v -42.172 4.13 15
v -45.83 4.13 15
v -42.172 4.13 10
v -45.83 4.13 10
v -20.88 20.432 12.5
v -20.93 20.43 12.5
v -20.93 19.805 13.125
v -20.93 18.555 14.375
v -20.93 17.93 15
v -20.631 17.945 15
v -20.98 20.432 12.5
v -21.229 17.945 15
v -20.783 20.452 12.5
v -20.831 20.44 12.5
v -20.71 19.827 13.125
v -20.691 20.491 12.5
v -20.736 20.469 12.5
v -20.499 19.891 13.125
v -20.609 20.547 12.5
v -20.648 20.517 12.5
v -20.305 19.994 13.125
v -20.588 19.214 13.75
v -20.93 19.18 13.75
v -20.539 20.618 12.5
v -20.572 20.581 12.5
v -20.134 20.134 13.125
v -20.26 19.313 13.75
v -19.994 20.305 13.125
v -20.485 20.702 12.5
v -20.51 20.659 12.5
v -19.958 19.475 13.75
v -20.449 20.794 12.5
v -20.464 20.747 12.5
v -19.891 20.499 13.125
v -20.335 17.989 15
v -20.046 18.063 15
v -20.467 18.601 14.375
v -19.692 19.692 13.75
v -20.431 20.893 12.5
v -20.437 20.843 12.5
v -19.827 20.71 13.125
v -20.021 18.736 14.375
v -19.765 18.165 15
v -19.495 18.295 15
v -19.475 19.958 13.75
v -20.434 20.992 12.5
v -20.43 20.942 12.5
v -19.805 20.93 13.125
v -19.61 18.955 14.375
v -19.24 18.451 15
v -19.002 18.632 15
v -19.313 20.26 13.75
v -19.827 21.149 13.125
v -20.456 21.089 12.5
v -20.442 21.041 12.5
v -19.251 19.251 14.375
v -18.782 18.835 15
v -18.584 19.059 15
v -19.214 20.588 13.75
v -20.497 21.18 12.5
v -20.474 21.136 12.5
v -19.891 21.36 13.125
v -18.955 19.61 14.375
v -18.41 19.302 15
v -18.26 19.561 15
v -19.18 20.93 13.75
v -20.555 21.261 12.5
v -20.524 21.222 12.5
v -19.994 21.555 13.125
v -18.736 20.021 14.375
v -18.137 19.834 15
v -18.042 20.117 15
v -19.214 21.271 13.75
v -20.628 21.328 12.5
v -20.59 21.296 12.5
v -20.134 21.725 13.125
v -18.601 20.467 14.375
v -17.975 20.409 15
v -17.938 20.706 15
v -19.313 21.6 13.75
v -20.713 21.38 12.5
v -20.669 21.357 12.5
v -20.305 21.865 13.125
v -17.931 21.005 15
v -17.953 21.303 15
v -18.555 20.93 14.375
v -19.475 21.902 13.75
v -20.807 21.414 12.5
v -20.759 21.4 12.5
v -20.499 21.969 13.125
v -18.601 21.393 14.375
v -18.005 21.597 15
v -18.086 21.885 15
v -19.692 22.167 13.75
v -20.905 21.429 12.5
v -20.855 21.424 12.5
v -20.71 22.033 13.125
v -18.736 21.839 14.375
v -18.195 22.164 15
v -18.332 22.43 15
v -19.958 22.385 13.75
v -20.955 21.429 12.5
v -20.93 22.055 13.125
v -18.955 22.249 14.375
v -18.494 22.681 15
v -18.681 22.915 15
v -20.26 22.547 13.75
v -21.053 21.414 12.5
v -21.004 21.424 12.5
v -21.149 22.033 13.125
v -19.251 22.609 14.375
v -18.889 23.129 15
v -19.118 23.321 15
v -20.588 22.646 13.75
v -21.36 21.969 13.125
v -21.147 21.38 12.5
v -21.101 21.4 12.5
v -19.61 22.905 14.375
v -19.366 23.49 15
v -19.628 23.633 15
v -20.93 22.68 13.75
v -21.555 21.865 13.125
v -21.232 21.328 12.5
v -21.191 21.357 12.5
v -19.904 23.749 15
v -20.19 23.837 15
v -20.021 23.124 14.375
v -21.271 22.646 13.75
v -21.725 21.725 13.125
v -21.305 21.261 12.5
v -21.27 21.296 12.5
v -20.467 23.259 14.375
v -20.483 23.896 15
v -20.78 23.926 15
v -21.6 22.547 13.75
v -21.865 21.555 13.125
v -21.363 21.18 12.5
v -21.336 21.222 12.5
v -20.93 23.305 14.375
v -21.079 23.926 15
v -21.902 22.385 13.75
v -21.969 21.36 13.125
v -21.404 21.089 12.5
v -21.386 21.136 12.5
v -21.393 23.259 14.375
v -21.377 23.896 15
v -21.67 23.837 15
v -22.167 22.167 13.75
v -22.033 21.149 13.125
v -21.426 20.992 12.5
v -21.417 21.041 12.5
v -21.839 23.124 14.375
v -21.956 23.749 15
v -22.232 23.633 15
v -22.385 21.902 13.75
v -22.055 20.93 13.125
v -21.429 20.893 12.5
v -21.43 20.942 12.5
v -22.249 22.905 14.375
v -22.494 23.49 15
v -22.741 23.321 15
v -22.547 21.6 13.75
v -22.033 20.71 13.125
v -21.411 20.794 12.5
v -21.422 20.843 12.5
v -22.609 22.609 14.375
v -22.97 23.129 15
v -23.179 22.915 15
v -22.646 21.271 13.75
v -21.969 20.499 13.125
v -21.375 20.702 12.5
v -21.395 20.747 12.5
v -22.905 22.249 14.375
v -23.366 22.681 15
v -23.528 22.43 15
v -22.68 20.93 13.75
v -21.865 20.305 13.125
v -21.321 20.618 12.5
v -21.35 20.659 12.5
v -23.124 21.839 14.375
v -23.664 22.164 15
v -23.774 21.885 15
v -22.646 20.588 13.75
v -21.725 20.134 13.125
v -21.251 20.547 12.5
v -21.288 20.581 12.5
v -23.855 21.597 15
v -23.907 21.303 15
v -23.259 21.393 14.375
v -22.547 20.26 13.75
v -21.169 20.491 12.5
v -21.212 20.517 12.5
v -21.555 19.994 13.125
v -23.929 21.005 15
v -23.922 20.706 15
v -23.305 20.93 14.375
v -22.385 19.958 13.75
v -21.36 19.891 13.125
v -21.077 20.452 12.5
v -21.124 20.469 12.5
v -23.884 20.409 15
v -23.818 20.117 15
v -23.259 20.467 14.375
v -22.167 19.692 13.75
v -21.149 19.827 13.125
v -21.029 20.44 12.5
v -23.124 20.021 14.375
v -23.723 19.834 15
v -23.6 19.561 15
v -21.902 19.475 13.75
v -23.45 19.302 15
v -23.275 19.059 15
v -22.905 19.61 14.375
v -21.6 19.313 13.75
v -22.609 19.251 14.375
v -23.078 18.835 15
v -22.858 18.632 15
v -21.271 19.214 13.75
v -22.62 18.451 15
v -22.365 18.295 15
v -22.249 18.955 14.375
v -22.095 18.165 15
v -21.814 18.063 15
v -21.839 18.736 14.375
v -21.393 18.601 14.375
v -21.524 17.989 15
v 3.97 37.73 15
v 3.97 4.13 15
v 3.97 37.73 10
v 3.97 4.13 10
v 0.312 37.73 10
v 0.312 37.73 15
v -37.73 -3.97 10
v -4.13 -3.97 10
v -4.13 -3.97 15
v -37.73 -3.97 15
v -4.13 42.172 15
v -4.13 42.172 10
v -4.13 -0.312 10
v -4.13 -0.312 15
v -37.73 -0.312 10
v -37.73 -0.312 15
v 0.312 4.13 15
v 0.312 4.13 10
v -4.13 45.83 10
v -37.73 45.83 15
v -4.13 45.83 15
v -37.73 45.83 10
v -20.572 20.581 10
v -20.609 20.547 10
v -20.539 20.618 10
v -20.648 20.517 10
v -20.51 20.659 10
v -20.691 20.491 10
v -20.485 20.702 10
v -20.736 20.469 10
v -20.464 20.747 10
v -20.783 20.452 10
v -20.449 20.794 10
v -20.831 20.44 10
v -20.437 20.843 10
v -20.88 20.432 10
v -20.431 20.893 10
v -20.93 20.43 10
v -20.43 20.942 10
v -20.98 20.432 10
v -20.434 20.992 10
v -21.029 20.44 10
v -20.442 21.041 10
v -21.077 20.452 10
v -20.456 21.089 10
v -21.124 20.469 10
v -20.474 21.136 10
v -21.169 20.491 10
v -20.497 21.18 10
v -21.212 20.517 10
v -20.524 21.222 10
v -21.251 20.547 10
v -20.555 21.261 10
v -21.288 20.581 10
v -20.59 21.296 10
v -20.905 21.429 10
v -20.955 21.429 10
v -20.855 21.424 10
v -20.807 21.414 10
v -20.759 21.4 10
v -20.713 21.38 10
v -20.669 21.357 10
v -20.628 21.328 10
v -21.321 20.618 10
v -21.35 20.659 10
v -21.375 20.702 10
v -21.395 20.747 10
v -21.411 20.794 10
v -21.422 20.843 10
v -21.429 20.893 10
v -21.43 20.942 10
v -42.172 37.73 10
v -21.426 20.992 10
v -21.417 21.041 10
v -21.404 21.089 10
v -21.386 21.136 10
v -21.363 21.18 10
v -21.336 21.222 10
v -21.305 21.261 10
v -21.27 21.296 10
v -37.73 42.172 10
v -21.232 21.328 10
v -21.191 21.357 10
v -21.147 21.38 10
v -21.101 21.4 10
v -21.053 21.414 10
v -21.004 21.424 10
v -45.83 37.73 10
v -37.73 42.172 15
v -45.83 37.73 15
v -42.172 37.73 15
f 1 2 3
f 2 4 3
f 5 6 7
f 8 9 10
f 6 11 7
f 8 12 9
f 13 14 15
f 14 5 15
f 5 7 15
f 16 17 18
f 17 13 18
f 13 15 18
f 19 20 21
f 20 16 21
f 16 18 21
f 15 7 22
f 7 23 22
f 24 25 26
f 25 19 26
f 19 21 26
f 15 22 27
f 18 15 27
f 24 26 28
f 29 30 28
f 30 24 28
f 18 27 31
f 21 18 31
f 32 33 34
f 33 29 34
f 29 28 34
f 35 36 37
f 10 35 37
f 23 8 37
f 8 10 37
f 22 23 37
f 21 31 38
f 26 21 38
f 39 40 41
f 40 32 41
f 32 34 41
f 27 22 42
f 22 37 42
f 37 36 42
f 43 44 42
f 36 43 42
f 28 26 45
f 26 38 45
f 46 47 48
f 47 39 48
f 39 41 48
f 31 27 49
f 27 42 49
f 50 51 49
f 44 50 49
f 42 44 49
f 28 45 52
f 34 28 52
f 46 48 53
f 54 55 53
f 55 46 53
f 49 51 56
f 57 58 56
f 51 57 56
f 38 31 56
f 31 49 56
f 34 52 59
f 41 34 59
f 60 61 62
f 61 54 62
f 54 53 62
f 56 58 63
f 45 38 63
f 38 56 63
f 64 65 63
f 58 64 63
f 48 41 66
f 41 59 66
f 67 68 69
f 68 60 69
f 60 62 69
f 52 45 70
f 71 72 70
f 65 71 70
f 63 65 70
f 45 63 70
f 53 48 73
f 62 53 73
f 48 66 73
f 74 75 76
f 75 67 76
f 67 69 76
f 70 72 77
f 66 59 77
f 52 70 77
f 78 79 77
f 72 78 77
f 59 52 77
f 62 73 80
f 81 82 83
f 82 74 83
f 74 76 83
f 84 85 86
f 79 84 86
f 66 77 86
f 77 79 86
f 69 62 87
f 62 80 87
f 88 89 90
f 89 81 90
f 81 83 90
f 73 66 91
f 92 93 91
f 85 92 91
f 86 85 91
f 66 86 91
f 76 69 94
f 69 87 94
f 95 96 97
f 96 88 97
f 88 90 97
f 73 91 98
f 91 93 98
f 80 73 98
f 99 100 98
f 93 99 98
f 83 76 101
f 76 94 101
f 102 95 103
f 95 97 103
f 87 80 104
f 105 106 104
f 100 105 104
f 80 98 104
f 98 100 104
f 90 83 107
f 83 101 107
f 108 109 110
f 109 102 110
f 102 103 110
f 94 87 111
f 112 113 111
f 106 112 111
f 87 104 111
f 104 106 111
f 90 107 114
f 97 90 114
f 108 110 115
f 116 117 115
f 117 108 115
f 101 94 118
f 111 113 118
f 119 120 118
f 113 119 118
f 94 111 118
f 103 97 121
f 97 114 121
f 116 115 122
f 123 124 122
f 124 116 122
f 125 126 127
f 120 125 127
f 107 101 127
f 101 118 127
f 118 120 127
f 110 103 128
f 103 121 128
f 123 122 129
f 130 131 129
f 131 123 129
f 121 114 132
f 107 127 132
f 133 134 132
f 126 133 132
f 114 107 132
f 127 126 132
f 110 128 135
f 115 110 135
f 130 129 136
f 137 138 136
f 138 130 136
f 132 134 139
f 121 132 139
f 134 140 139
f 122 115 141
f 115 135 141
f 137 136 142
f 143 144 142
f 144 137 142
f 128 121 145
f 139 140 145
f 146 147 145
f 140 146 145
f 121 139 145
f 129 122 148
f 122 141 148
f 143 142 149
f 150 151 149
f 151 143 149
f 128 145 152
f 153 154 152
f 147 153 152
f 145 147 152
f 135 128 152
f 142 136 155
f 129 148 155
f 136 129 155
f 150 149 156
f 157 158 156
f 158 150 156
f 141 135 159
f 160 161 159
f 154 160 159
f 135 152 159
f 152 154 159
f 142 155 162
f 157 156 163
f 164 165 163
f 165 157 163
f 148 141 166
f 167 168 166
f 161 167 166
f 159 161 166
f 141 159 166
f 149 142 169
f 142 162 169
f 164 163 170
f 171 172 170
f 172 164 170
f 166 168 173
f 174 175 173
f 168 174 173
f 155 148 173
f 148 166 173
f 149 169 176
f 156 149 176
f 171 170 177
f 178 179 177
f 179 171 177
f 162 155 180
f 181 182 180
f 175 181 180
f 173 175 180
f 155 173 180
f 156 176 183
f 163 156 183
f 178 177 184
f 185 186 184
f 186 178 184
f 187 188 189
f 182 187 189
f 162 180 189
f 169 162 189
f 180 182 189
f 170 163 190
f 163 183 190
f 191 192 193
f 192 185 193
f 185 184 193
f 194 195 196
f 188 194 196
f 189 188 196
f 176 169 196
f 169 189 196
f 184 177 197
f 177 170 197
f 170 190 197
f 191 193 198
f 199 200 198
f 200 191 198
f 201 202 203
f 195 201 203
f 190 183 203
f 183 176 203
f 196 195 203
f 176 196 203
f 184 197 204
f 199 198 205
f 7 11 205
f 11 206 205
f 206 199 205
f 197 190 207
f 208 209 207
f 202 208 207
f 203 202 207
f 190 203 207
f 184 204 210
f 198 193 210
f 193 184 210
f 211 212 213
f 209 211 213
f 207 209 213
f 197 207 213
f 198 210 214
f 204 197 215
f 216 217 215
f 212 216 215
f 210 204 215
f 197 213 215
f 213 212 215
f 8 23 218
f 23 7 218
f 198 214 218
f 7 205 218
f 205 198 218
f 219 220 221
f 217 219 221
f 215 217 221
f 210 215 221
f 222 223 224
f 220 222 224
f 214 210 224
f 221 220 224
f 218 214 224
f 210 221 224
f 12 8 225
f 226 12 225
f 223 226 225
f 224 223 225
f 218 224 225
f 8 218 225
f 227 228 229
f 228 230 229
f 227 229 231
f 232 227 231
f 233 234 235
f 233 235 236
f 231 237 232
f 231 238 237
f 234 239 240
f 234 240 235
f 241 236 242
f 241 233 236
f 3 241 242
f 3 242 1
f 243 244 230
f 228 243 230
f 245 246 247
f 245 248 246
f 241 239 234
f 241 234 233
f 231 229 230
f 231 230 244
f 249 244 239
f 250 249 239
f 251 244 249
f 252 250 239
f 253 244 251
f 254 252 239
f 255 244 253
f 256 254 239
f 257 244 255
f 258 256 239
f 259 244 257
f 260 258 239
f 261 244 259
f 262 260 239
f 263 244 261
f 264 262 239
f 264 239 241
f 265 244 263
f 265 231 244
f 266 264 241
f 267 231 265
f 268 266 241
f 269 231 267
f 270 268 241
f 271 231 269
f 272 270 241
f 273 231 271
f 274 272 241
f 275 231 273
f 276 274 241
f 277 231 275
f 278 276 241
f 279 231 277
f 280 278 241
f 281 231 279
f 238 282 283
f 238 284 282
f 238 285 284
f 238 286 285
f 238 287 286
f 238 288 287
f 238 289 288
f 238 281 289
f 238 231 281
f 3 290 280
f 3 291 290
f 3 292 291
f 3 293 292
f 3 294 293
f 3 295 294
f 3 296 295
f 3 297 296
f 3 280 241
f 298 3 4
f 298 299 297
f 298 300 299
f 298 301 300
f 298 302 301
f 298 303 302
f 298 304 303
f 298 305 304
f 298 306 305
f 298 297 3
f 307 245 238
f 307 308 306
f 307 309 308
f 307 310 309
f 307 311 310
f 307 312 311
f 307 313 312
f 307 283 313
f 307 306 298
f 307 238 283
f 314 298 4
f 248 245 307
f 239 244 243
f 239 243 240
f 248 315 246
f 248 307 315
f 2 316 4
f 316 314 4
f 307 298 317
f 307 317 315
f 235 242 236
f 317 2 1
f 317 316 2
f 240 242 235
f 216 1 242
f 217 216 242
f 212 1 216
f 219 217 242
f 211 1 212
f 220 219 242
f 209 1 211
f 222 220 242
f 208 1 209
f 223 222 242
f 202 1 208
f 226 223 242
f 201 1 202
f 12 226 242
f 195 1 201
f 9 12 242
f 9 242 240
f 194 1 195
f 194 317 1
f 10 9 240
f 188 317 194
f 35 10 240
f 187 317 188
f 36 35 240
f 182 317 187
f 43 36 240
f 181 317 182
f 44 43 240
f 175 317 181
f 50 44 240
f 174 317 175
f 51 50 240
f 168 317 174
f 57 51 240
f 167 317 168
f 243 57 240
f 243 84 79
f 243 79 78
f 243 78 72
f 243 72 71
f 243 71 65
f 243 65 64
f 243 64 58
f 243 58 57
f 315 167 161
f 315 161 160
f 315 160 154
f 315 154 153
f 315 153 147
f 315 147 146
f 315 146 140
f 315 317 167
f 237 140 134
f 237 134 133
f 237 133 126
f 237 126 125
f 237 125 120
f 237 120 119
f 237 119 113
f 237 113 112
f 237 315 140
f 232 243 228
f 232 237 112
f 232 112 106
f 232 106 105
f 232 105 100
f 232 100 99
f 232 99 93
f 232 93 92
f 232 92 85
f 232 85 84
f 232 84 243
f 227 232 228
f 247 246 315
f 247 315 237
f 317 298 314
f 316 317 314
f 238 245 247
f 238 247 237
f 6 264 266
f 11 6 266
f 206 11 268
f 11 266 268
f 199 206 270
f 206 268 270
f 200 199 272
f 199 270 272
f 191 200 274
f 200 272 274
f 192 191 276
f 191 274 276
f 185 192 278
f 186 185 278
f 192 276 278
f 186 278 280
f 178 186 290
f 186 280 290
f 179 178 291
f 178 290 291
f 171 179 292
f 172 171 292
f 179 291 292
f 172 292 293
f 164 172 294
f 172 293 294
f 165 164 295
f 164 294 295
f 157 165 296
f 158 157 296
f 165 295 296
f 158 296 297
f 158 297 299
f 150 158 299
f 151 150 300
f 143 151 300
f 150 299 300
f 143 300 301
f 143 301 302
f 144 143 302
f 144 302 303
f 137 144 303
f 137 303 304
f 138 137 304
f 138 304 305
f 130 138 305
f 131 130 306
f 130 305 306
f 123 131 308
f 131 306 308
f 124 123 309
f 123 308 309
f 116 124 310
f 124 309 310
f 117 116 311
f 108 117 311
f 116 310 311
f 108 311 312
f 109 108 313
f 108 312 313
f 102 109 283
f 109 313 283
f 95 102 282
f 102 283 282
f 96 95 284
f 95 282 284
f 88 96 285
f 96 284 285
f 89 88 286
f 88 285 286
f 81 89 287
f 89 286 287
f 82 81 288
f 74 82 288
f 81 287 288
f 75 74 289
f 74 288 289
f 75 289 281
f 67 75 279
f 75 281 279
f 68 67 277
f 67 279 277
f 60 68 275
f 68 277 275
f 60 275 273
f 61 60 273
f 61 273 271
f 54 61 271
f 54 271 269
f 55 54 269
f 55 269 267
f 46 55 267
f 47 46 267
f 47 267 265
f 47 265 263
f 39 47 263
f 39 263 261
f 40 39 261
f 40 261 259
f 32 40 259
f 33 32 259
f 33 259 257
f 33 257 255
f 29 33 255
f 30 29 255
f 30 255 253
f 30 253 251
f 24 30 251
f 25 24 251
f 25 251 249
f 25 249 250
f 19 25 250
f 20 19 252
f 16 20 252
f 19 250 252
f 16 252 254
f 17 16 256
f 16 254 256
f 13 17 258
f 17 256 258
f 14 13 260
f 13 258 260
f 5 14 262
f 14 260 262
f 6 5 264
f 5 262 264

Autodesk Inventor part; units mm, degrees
ref_plane "YZ Plane" through (0, 0, 0) normal (1, 0, 0) x (0, 1, 0)
ref_plane "Work Plane1" through (0, 0, 10) normal (0, 0, 1) x (1, 0, 0)
sketch "Sketch1" plane through (0, 0, 10) normal (0, 0, 1) x (1, 0, 0)
  line L0 (-4.0299, -0.3538) -> (-2.2322, 1.4439) construction
  arc A0 (-1.4439, 2.2322) -> (-2.2322, 1.4439) centre (-0.9299, 0.9299) ccw construction
  line L1 (-1.4439, 2.2322) -> (0.3538, 4.0299) construction
  line L2 (-37.8299, 42.2137) -> (-37.8299, 45.8299) construction
  line L3 (-37.8299, 45.8299) -> (-4.0299, 45.8299) construction
  line L4 (-4.0299, 45.8299) -> (-4.0299, 42.2137) construction
  line L5 (-4.0299, 4.0299) -> (0.3538, 4.0299) projected
  line L6 (-20.9299, 58.9723) -> (17.1124, 20.9299) construction
  line L7 (17.1124, 20.9299) -> (-20.9299, -17.1124) construction
  line L8 (-20.9299, -17.1124) -> (-58.9723, 20.9299) construction
  line L9 (-58.9723, 20.9299) -> (-20.9299, 58.9723) construction
  line L10 (-20.9299, 58.9723) -> (-20.9299, -17.1124) construction
  line L11 (17.1124, 20.9299) -> (-58.9723, 20.9299) construction
  line L12 (-20.9299, 58.9723) -> (32.8701, 58.9723) construction
  line L13 (-43.4299, 43.4299) -> (1.5701, 43.4299) construction
  line L14 (1.5701, 43.4299) -> (1.5701, -1.5701) construction
  line L15 (1.5701, -1.5701) -> (-43.4299, -1.5701) construction
  line L16 (-43.4299, -1.5701) -> (-43.4299, 43.4299) construction
  line L17 (-43.4299, 43.4299) -> (1.5701, -1.5701) construction
  line L18 (1.5701, 43.4299) -> (-43.4299, -1.5701) construction
  line L19 (-43.4299, 5.3876) -> (-43.4299, 36.4723)
  line L20 (-43.4299, 36.4723) -> (-36.4723, 43.4299)
  line L21 (-36.4723, 43.4299) -> (-5.3876, 43.4299)
  line L22 (-5.3876, 43.4299) -> (1.5701, 36.4723)
  line L23 (1.5701, 36.4723) -> (1.5701, 5.3876)
  line L24 (1.5701, 5.3876) -> (-5.3876, -1.5701)
  line L25 (-5.3876, -1.5701) -> (-36.4723, -1.5701)
  line L26 (-36.4723, -1.5701) -> (-43.4299, 5.3876)
  line L27 (-4.0299, 42.2137) -> (-37.8299, 42.2137) projected
  line L28 (-4.0299, -0.3538) -> (-4.0299, 4.0299) projected
  circle A1 centre (-20.9299, 20.9299) radius 11.75
  point P0 (-37.8299, 4.0299)
  dimension "d18" = 53.8
  dimension "d19" = 45
  dimension "d20" = 53.8
  dimension "d21" = 45
  dimension "d22" = 45
  dimension "d30" = 23.5
extrude "Extrusion1" add sketch "Sketch1" along normal blind 5 contours L28 L24 L25 L26 L19 L20 L27 L22 L23 L5 | L5 L24 L28 | L27 L20 L21 L22 | A1
ref_plane "Work Plane2" through (-40.9959, 0.8639, 22.2359) normal (0, 0, 1) x (1, 0, 0)
sketch "Sketch3" plane through (0, 0, 10) normal (0, 0, -1) x (-1, 0, 0)
  line L0 (37.8299, -0.4701) -> (37.8299, 4.0299) construction
  line L1 (4.0299, 4.0299) -> (4.0299, -0.4701) construction
  line L2 (37.8299, -0.4701) -> (37.8299, 1.1886) construction
  line L3 (4.0299, -3.9701) -> (4.0299, -0.3538) construction
  line L4 (45.8299, 4.0299) -> (42.2137, 4.0299) construction
  line L5 (-0.3538, 4.0299) -> (-3.9701, 4.0299) construction
  line L6 (-3.9701, 37.8299) -> (-0.3538, 37.8299) construction
  line L7 (4.0299, 42.2137) -> (4.0299, 45.8299) construction
  line L8 (37.8299, 45.8299) -> (37.8299, 42.2137) construction
  line L9 (42.2137, 37.8299) -> (45.8299, 37.8299) construction
  line L10 (37.8299, 37.7299) -> (45.8299, 37.7299)
  line L11 (45.8299, 37.7299) -> (45.8299, 4.1299)
  line L12 (45.8299, 4.1299) -> (37.8299, 4.1299)
  line L13 (37.8299, 4.1299) -> (37.8299, 37.7299)
  line L14 (37.7299, 4.0299) -> (4.1299, 4.0299)
  line L15 (4.1299, 4.0299) -> (4.1299, -3.9701)
  line L16 (4.1299, -3.9701) -> (37.7299, -3.9701)
  line L17 (37.7299, -3.9701) -> (37.7299, 4.0299)
  line L18 (4.0299, 4.1299) -> (-3.9701, 4.1299)
  line L19 (-3.9701, 4.1299) -> (-3.9701, 37.7299)
  line L20 (-3.9701, 37.7299) -> (4.0299, 37.7299)
  line L21 (4.0299, 37.7299) -> (4.0299, 4.1299)
  line L22 (4.1299, 37.8299) -> (37.7299, 37.8299)
  line L23 (37.7299, 37.8299) -> (37.7299, 45.8299)
  line L24 (37.7299, 45.8299) -> (4.1299, 45.8299)
  line L25 (4.1299, 45.8299) -> (4.1299, 37.8299)
  point P0 (0, 0)
  dimension "d23" = 0.1
  dimension "d24" = 0.1
  dimension "d25" = 0.1
  dimension "d26" = 0.1
  dimension "d27" = 0.1
extrude "Extrusion3" add sketch "Sketch3" against normal up to surface (5 mm away)
sketch "Sketch6" plane through (0, 0, 15) normal (0, 0, 1) x (1, 0, 0)
  line L0 (-37.7299, 45.8299) -> (-4.1299, 45.8299) projected
  line L1 (3.9701, 37.7299) -> (3.9701, 4.1299) projected
  point P0 (0, 0)
  point P1 (-20.9299, 20.9299)
  point P2 (-20.9299, 45.8299)
  point P3 (3.9701, 20.9299)
hole "Hole1" at (-20.9299, 20.9299, 15) direction (0, 0, -1) diameter 1 depth 8 countersink diameter 6 countersink angle 90
properties part number "20_Cube_Insert_Pinhole_conic hole"
